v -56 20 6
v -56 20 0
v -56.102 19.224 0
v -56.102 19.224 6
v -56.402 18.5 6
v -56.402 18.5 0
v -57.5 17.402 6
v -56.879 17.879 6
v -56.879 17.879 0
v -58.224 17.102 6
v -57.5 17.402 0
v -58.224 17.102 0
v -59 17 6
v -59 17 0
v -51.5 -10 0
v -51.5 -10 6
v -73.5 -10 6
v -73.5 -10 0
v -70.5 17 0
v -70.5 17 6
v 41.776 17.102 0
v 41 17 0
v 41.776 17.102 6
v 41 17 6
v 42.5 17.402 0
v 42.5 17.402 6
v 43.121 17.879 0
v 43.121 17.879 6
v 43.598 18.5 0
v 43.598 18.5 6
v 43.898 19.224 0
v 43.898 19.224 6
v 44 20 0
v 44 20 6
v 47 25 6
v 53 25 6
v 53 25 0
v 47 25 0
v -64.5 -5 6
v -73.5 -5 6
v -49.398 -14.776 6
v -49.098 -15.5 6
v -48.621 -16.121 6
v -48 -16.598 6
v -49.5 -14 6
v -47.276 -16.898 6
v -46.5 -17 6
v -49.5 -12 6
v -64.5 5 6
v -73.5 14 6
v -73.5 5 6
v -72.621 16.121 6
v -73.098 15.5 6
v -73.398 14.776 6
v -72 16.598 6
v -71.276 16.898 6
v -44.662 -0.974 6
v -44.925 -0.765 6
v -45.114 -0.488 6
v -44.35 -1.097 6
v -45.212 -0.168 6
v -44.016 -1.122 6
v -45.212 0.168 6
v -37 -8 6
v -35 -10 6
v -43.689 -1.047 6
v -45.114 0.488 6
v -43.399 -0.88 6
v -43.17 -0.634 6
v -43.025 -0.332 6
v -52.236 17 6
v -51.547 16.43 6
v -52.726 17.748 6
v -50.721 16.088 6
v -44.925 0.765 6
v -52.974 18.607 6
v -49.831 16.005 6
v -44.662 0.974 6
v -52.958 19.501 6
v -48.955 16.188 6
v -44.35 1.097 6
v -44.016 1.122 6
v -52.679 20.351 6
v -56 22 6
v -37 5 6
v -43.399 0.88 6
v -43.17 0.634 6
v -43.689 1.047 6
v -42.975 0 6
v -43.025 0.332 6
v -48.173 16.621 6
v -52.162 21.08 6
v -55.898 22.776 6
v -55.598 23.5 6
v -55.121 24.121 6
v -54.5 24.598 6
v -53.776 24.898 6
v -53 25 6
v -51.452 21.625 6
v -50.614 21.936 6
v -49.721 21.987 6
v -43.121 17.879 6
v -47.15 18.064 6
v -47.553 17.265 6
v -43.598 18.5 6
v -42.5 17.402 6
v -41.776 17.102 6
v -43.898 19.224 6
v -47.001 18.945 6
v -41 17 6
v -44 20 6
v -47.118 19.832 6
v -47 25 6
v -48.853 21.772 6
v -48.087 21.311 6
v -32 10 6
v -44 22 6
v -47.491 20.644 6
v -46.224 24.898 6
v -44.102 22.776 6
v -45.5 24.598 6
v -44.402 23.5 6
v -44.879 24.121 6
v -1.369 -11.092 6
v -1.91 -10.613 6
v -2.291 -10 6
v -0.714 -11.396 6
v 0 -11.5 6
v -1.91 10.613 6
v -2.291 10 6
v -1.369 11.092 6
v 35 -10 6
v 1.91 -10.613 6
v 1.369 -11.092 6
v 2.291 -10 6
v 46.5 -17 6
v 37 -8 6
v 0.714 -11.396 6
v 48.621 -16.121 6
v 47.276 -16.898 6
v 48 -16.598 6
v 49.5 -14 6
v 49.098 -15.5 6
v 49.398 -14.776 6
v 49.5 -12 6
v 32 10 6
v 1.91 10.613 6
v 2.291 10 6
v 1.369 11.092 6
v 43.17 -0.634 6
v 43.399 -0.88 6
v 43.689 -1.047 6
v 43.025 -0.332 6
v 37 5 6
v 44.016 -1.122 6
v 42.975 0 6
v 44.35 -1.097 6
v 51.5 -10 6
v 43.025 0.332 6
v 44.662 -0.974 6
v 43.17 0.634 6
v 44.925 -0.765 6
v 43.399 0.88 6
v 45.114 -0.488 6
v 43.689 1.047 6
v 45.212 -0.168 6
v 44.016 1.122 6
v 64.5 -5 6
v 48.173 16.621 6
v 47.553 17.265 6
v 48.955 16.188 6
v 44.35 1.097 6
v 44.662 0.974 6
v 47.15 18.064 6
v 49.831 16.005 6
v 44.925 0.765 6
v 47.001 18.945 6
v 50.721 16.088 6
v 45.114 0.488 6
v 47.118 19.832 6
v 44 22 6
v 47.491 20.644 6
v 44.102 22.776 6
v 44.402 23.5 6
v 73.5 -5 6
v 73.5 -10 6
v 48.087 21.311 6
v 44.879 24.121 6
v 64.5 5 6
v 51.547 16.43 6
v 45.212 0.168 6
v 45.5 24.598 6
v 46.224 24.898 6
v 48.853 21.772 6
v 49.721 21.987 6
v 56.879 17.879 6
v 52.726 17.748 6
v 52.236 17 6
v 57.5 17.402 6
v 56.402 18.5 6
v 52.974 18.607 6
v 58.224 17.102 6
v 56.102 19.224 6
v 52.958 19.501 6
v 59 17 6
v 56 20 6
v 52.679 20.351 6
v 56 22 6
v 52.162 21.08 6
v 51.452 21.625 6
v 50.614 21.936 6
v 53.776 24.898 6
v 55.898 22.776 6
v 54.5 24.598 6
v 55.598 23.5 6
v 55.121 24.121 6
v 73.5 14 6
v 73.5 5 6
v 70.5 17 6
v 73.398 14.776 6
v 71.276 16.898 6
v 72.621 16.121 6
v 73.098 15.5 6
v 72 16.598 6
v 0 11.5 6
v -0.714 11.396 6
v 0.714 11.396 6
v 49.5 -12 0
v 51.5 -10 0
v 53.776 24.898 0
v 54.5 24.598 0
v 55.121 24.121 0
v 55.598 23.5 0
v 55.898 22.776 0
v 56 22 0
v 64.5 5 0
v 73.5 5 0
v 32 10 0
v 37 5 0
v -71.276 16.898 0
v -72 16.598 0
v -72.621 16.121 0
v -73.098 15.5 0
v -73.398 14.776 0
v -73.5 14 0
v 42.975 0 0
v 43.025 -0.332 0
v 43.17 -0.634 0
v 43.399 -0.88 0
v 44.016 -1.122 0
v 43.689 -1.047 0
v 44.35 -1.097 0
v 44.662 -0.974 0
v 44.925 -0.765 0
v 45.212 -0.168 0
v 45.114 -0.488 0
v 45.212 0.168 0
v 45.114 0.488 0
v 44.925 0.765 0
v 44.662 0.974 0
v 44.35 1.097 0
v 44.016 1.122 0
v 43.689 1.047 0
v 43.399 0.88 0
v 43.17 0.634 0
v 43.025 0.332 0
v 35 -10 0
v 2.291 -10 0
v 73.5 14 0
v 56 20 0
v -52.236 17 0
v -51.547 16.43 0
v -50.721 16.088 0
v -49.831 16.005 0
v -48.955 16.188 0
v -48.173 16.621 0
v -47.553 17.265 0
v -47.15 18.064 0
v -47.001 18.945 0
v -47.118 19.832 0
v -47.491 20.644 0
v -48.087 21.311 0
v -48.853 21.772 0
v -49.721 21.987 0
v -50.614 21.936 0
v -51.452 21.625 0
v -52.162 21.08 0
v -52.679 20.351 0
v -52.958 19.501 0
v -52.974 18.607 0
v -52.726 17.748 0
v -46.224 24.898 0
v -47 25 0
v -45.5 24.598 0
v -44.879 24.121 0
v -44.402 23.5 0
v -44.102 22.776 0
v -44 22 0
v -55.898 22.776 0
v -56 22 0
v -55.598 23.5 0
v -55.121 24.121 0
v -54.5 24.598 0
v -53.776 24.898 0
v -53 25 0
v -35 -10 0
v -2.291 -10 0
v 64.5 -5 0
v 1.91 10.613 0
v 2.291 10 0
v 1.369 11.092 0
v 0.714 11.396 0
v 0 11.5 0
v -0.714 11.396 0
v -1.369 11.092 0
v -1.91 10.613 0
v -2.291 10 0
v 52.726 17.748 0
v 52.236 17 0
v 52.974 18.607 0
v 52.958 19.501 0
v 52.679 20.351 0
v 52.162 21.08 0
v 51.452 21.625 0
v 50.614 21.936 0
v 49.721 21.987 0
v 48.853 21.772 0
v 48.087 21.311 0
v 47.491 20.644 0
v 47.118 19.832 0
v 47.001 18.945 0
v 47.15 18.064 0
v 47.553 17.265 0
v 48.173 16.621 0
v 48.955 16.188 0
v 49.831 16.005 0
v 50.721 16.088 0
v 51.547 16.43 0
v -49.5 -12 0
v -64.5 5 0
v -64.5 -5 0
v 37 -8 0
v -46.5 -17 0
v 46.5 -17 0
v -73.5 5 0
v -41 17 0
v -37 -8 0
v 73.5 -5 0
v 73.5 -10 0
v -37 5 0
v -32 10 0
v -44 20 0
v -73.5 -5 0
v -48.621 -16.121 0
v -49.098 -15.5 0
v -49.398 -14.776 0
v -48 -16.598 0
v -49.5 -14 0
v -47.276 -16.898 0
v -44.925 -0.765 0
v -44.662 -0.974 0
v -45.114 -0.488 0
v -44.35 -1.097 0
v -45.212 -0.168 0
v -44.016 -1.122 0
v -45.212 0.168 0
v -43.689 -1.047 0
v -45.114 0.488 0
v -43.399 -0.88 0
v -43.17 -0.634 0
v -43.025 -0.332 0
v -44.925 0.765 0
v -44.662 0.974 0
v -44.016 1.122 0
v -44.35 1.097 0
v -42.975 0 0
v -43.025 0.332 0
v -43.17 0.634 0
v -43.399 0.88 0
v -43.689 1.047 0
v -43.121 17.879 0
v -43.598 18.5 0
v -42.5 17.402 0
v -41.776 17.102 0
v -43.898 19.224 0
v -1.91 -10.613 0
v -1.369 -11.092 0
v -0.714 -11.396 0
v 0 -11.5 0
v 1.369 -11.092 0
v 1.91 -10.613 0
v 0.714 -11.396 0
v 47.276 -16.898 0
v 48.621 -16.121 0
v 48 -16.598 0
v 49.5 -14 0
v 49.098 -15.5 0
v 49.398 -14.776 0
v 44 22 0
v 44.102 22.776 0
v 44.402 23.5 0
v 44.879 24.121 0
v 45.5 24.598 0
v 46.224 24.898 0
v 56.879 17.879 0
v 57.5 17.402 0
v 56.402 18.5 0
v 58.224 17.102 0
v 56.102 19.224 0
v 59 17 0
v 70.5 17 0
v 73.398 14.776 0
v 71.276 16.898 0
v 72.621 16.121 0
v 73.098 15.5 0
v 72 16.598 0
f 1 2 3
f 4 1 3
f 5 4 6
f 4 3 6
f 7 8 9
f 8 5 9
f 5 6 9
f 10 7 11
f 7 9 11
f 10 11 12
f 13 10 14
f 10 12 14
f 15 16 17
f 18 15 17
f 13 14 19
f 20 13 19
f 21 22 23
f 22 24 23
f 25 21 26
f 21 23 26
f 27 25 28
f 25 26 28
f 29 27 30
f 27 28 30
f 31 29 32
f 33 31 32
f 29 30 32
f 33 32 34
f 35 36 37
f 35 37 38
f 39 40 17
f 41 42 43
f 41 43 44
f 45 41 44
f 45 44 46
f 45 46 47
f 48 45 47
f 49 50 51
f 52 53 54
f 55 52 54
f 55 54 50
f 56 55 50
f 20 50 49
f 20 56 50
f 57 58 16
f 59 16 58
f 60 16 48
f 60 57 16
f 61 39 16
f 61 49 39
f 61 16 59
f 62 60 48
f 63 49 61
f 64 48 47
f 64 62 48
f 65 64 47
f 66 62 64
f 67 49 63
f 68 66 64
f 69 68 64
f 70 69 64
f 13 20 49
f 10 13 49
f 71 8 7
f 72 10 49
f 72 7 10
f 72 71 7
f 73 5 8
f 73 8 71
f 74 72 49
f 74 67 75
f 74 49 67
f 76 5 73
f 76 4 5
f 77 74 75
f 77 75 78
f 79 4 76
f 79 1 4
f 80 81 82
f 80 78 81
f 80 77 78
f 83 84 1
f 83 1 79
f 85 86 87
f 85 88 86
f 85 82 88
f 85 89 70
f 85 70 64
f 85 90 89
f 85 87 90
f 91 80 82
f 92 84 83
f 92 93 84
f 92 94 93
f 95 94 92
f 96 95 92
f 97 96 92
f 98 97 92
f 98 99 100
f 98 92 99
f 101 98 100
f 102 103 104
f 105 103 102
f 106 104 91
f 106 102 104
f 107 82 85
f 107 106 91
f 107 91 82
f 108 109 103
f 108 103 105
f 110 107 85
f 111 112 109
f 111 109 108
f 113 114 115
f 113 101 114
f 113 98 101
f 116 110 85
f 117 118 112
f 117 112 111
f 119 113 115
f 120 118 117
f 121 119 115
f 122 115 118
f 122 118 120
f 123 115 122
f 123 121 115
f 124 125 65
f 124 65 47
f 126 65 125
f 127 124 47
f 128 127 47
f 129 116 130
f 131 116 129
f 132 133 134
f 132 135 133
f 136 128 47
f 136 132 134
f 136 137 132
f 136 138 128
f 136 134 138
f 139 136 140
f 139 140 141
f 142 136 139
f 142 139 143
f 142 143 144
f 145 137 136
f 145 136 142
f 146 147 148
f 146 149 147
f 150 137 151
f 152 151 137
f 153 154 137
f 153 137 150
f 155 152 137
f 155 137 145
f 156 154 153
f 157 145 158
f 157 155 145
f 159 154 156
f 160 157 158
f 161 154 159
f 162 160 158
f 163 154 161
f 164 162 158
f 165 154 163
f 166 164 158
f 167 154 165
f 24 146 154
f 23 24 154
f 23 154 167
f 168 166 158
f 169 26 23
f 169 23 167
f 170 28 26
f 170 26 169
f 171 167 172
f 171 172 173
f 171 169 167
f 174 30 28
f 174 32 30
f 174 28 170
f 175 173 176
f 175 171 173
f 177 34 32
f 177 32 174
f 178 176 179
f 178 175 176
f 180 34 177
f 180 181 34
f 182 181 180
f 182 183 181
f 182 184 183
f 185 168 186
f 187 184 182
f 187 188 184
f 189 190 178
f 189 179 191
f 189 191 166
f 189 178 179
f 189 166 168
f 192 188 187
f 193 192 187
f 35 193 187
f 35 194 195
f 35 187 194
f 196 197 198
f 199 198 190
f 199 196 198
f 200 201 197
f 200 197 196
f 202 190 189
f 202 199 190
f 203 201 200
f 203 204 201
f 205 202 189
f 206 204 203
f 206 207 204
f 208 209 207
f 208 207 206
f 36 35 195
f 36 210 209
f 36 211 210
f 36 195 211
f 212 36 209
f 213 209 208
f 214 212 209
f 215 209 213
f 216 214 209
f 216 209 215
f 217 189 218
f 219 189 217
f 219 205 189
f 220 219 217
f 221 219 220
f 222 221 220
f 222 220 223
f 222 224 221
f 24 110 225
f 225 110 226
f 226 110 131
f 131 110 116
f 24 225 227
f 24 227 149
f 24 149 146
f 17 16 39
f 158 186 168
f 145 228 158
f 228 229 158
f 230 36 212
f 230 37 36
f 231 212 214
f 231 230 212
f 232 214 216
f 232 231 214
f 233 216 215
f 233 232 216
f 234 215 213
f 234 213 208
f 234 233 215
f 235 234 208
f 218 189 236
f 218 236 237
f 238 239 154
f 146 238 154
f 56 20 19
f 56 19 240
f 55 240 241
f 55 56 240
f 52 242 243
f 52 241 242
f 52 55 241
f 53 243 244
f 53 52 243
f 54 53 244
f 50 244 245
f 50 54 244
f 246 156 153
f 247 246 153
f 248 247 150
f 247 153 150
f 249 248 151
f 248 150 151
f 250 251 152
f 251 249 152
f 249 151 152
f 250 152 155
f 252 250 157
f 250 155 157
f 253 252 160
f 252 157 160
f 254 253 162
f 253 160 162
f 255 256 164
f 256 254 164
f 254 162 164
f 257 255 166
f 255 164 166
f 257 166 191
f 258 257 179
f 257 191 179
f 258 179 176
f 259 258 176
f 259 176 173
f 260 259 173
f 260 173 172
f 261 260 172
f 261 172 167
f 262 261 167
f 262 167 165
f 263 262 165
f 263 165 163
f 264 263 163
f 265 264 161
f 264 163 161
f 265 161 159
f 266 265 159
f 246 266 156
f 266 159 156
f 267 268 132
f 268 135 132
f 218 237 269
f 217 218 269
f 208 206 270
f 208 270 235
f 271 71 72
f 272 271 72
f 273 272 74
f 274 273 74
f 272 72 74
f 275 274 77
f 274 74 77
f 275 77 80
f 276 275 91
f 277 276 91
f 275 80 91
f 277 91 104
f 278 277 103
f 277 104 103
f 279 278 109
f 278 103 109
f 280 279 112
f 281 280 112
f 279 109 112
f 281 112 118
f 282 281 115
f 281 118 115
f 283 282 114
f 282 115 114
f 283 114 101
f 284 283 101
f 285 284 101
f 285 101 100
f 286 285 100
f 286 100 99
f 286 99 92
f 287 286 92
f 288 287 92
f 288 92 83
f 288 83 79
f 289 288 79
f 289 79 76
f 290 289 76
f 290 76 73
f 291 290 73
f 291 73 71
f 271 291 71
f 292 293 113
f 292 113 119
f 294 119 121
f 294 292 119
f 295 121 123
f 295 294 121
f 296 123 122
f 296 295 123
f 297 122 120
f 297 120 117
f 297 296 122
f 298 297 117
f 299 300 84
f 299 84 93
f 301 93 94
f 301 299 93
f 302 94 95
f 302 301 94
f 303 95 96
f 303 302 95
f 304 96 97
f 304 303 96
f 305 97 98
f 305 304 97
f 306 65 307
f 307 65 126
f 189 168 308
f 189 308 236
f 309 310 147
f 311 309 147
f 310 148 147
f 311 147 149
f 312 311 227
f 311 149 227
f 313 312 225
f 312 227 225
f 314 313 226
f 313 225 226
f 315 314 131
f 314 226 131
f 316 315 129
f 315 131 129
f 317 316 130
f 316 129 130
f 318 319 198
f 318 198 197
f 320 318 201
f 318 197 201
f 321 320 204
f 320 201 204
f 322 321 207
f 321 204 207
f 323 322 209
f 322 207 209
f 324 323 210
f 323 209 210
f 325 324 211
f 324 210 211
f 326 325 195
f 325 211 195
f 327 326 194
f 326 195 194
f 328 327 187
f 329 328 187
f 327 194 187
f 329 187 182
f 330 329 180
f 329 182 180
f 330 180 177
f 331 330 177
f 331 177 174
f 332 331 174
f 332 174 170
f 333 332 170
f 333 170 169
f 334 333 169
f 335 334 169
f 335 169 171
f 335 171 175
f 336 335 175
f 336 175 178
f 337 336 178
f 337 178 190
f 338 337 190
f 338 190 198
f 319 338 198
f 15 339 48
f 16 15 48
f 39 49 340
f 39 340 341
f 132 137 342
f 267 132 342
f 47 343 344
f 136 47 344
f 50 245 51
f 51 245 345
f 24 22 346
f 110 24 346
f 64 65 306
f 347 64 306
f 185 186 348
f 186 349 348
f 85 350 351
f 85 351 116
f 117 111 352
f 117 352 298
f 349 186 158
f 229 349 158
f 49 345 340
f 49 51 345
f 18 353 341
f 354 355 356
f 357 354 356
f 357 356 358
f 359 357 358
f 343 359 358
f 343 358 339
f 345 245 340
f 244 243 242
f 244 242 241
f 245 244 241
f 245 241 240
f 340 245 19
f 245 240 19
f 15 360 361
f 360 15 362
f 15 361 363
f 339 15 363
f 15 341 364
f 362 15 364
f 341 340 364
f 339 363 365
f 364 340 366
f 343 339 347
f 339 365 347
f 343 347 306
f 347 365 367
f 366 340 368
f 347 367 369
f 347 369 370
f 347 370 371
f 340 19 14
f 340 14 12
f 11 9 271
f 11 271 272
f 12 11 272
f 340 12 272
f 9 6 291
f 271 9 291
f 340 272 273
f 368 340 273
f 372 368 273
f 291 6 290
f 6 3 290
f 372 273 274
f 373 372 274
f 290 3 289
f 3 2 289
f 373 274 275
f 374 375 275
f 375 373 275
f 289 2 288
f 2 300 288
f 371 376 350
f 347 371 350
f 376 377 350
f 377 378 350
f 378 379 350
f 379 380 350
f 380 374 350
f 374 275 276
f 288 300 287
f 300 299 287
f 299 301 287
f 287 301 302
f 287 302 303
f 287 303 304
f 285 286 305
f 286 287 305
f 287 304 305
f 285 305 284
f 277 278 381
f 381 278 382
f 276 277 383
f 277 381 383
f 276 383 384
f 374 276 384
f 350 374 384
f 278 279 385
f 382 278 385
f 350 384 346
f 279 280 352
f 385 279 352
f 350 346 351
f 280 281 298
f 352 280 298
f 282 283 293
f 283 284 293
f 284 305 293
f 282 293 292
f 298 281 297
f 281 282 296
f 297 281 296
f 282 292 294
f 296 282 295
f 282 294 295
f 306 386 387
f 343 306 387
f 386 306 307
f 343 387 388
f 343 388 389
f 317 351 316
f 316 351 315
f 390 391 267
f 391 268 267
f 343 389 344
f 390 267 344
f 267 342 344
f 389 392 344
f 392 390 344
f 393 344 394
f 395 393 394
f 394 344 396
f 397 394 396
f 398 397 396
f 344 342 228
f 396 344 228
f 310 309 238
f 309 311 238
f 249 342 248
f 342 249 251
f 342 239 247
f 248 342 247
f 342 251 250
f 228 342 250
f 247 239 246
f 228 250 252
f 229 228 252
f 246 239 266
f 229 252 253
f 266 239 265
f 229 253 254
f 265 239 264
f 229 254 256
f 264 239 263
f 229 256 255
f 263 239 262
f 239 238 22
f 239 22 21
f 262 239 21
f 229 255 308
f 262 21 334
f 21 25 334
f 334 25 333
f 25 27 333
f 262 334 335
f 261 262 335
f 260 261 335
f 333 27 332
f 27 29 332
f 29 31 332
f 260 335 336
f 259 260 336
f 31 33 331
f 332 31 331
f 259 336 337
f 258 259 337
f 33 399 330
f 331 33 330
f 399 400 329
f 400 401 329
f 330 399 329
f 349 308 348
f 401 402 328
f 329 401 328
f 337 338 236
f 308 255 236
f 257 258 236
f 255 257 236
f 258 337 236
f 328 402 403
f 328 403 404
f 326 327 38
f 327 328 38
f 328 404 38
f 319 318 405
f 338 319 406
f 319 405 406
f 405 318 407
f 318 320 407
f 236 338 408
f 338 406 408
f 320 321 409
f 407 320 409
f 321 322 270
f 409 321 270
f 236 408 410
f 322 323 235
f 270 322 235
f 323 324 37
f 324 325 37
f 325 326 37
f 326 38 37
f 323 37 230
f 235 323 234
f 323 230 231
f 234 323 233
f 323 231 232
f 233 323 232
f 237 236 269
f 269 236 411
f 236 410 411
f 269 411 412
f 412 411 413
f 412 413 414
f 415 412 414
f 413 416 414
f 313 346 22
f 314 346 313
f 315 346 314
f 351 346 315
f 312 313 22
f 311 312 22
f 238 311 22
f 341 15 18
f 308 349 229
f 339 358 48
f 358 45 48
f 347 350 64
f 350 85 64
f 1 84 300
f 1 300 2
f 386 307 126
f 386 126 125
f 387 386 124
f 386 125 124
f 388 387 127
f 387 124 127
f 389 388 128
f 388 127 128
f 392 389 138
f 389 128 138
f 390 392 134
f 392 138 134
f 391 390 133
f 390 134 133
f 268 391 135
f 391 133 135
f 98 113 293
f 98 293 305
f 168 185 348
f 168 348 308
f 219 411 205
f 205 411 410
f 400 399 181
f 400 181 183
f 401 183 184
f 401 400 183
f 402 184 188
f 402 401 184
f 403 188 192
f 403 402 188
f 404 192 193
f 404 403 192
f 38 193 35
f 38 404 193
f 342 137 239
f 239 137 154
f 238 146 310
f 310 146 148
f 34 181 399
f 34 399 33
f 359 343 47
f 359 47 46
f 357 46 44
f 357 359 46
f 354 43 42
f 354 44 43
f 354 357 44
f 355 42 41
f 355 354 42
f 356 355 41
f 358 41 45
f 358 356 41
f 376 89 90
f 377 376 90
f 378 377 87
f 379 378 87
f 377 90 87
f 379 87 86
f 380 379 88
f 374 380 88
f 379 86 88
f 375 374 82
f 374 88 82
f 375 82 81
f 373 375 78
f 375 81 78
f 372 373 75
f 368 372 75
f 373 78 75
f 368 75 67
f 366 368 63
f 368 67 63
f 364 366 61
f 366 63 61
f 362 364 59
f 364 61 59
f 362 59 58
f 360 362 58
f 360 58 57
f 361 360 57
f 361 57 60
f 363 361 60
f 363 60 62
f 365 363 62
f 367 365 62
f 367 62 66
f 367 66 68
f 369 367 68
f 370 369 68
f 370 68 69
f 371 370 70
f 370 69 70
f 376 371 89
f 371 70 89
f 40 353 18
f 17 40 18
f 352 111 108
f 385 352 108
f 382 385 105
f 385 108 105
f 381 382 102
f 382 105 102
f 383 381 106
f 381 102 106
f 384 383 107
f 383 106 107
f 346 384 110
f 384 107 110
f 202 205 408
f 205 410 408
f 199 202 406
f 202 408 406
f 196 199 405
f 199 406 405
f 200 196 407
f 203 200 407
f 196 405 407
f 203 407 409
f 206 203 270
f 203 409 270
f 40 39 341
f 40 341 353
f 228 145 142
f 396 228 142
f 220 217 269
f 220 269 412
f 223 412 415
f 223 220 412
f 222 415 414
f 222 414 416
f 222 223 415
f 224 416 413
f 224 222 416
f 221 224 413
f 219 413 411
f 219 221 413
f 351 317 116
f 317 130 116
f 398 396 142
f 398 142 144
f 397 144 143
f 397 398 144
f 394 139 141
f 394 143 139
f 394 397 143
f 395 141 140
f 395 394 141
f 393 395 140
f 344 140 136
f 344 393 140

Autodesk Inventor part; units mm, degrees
ref_plane "YZ Plane" through (0, 0, 0) normal (1, 0, 0) x (0, 1, 0)
ref_plane "XZ Plane" through (0, 0, 0) normal (0, 1, 0) x (-1, 0, 0)
ref_plane "XY Plane" through (0, 0, 0) normal (0, 0, 1) x (1, 0, 0)
sketch "Sketch1" plane through (0, 0, 0) normal (0, 0, 1) x (1, 0, 0)
  line L0 (-73.5, -17) -> (73.5, -17)
  line L1 (73.5, -17) -> (73.5, 17)
  line L2 (73.5, 17) -> (-73.5, 17)
  line L3 (-73.5, 17) -> (-73.5, -17)
  line L4 (-73.5, -17) -> (73.5, 17) construction
  line L5 (73.5, -17) -> (-73.5, 17) construction
  point P0 (0, 0)
  dimension "d0" = 147
  dimension "d1" = 34
extrude "Extrusion1" add sketch "Sketch1" along normal blind 6
sketch "Sketch2" plane through (0, 0, 6) normal (0, 0, 1) x (1, 0, 0)
  line L0 (-37, -10) -> (37, -10)
  line L1 (37, -10) -> (37, 10)
  line L2 (37, 10) -> (-37, 10)
  line L3 (-37, 10) -> (-37, -10)
  line L4 (-37, -10) -> (37, 10) construction
  line L5 (37, -10) -> (-37, 10) construction
  point P0 (0, 0)
  dimension "d4" = 74
  dimension "d5" = 20
extrude "Extrusion2" cut sketch "Sketch2" against normal blind 6
sketch "Sketch3" plane through (0, 0, 6) normal (0, 0, 1) x (1, 0, 0)
  circle A0 centre (0, 9) radius 2.5
  circle A1 centre (0, -9) radius 2.5
  point P0 (0, 0)
  dimension "d8" = 5
  dimension "d10" = 9
  dimension "d11" = 5
  dimension "d12" = 9
extrude "Extrusion3" cut sketch "Sketch3" against normal blind 6
sketch "Sketch4" plane through (0, 0, 6) normal (0, 0, 1) x (1, 0, 0)
  line L0 (73.5, 17) -> (-73.5, 17) projected
  circle A0 centre (-50, 19) radius 3
  line L1 (-56, 13) -> (-44, 13)
  line L2 (-44, 13) -> (-44, 25)
  line L3 (-44, 25) -> (-56, 25)
  line L4 (-56, 25) -> (-56, 13)
  line L5 (-56, 13) -> (-44, 25) construction
  line L6 (-44, 13) -> (-56, 25) construction
  point P0 (0, 0)
  dimension "d15" = 6
  dimension "d16" = 12
  dimension "d17" = 12
  dimension "d18" = 50
  dimension "d19" = 2
extrude "Extrusion4" add sketch "Sketch4" against normal blind 6 contours L2 L1 L4 L0 A0 | L0 A0 L4 L3 L2
sketch "Sketch5" plane through (0, 0, 6) normal (0, 0, 1) x (1, 0, 0)
  line L0 (-73.5, 17) -> (-73.5, -17) projected
  line L1 (-37, -10) -> (-37, 10) projected
  line L2 (-73.5, 5) -> (-64.5, 5)
  line L3 (-64.5, 5) -> (-64.5, -5)
  line L4 (-64.5, -5) -> (-73.5, -5)
  line L5 (-73.5, -5) -> (-73.5, 5)
  point P0 (0, 0)
  point P1 (-73.5, 0)
  point P2 (-37, 0)
  dimension "d22" = 9
  dimension "d23" = 10
extrude "Extrusion5" cut sketch "Sketch5" against normal blind 6
sketch "Sketch6" plane through (0, 0, 6) normal (0, 0, 1) x (1, 0, 0)
  line L0 (-73.5, -17) -> (-49.5, -17)
  line L1 (-49.5, -17) -> (-49.5, -10)
  line L2 (-49.5, -10) -> (-73.5, -10)
  line L3 (-73.5, -10) -> (-73.5, -17)
  point P0 (0, 0)
  dimension "d26" = 24
  dimension "d28" = 7
extrude "Extrusion6" cut sketch "Sketch6" against normal blind 6
sketch "Sketch7" plane through (0, 0, 6) normal (0, 0, 1) x (1, 0, 0)
  line L0 (-37, -10) -> (-37, 10) projected
  circle A0 centre (-44.1, 0) radius 1.125
  point P0 (0, 0)
  point P1 (-37, 0)
  dimension "d31" = 2.25
  dimension "d32" = 44.1
extrude "Extrusion7" cut sketch "Sketch7" against normal blind 6
mirror "Mirror1" about plane through (0, 0, 0) normal (1, 0, 0) of "Extrusion4", "Extrusion5", "Extrusion6", "Extrusion7"
chamfer "Chamfer3" distance 5 angle 45 2 edges at (-37, 10, 3) (37, 10, 3)
chamfer "Chamfer4" distance 2 angle 45 4 edges at (-37, -10, 3) (-49.5, -10, 3) (37, -10, 3) (49.5, -10, 3)
fillet "Fillet2" radius 3 12 edges at (-73.5, 17, 3) (-56, 17, 3) (-56, 25, 3) (-44, 25, 3) (-44, 17, 3) (-49.5, -17, 3) (49.5, -17, 3) (73.5, 17, 3) (56, 17, 3) (56, 25, 3) (44, 25, 3) (44, 17, 3)
sketch "Sketch8" plane through (0, 0, 6) normal (0, 0, 1) x (1, 0, 0)
  circle A0 centre (50, 19) radius 3
  circle A1 centre (-50, 19) radius 3
  arc A2 (-47.7639, 17) -> (-52.2361, 17) centre (-50, 19) ccw projected
  arc A3 (52.2361, 17) -> (47.7639, 17) centre (50, 19) ccw projected
  point P0 (0, 0)
extrude "Extrusion8" cut sketch "Sketch8" against normal through all
properties part number "camera_mount_v1"
